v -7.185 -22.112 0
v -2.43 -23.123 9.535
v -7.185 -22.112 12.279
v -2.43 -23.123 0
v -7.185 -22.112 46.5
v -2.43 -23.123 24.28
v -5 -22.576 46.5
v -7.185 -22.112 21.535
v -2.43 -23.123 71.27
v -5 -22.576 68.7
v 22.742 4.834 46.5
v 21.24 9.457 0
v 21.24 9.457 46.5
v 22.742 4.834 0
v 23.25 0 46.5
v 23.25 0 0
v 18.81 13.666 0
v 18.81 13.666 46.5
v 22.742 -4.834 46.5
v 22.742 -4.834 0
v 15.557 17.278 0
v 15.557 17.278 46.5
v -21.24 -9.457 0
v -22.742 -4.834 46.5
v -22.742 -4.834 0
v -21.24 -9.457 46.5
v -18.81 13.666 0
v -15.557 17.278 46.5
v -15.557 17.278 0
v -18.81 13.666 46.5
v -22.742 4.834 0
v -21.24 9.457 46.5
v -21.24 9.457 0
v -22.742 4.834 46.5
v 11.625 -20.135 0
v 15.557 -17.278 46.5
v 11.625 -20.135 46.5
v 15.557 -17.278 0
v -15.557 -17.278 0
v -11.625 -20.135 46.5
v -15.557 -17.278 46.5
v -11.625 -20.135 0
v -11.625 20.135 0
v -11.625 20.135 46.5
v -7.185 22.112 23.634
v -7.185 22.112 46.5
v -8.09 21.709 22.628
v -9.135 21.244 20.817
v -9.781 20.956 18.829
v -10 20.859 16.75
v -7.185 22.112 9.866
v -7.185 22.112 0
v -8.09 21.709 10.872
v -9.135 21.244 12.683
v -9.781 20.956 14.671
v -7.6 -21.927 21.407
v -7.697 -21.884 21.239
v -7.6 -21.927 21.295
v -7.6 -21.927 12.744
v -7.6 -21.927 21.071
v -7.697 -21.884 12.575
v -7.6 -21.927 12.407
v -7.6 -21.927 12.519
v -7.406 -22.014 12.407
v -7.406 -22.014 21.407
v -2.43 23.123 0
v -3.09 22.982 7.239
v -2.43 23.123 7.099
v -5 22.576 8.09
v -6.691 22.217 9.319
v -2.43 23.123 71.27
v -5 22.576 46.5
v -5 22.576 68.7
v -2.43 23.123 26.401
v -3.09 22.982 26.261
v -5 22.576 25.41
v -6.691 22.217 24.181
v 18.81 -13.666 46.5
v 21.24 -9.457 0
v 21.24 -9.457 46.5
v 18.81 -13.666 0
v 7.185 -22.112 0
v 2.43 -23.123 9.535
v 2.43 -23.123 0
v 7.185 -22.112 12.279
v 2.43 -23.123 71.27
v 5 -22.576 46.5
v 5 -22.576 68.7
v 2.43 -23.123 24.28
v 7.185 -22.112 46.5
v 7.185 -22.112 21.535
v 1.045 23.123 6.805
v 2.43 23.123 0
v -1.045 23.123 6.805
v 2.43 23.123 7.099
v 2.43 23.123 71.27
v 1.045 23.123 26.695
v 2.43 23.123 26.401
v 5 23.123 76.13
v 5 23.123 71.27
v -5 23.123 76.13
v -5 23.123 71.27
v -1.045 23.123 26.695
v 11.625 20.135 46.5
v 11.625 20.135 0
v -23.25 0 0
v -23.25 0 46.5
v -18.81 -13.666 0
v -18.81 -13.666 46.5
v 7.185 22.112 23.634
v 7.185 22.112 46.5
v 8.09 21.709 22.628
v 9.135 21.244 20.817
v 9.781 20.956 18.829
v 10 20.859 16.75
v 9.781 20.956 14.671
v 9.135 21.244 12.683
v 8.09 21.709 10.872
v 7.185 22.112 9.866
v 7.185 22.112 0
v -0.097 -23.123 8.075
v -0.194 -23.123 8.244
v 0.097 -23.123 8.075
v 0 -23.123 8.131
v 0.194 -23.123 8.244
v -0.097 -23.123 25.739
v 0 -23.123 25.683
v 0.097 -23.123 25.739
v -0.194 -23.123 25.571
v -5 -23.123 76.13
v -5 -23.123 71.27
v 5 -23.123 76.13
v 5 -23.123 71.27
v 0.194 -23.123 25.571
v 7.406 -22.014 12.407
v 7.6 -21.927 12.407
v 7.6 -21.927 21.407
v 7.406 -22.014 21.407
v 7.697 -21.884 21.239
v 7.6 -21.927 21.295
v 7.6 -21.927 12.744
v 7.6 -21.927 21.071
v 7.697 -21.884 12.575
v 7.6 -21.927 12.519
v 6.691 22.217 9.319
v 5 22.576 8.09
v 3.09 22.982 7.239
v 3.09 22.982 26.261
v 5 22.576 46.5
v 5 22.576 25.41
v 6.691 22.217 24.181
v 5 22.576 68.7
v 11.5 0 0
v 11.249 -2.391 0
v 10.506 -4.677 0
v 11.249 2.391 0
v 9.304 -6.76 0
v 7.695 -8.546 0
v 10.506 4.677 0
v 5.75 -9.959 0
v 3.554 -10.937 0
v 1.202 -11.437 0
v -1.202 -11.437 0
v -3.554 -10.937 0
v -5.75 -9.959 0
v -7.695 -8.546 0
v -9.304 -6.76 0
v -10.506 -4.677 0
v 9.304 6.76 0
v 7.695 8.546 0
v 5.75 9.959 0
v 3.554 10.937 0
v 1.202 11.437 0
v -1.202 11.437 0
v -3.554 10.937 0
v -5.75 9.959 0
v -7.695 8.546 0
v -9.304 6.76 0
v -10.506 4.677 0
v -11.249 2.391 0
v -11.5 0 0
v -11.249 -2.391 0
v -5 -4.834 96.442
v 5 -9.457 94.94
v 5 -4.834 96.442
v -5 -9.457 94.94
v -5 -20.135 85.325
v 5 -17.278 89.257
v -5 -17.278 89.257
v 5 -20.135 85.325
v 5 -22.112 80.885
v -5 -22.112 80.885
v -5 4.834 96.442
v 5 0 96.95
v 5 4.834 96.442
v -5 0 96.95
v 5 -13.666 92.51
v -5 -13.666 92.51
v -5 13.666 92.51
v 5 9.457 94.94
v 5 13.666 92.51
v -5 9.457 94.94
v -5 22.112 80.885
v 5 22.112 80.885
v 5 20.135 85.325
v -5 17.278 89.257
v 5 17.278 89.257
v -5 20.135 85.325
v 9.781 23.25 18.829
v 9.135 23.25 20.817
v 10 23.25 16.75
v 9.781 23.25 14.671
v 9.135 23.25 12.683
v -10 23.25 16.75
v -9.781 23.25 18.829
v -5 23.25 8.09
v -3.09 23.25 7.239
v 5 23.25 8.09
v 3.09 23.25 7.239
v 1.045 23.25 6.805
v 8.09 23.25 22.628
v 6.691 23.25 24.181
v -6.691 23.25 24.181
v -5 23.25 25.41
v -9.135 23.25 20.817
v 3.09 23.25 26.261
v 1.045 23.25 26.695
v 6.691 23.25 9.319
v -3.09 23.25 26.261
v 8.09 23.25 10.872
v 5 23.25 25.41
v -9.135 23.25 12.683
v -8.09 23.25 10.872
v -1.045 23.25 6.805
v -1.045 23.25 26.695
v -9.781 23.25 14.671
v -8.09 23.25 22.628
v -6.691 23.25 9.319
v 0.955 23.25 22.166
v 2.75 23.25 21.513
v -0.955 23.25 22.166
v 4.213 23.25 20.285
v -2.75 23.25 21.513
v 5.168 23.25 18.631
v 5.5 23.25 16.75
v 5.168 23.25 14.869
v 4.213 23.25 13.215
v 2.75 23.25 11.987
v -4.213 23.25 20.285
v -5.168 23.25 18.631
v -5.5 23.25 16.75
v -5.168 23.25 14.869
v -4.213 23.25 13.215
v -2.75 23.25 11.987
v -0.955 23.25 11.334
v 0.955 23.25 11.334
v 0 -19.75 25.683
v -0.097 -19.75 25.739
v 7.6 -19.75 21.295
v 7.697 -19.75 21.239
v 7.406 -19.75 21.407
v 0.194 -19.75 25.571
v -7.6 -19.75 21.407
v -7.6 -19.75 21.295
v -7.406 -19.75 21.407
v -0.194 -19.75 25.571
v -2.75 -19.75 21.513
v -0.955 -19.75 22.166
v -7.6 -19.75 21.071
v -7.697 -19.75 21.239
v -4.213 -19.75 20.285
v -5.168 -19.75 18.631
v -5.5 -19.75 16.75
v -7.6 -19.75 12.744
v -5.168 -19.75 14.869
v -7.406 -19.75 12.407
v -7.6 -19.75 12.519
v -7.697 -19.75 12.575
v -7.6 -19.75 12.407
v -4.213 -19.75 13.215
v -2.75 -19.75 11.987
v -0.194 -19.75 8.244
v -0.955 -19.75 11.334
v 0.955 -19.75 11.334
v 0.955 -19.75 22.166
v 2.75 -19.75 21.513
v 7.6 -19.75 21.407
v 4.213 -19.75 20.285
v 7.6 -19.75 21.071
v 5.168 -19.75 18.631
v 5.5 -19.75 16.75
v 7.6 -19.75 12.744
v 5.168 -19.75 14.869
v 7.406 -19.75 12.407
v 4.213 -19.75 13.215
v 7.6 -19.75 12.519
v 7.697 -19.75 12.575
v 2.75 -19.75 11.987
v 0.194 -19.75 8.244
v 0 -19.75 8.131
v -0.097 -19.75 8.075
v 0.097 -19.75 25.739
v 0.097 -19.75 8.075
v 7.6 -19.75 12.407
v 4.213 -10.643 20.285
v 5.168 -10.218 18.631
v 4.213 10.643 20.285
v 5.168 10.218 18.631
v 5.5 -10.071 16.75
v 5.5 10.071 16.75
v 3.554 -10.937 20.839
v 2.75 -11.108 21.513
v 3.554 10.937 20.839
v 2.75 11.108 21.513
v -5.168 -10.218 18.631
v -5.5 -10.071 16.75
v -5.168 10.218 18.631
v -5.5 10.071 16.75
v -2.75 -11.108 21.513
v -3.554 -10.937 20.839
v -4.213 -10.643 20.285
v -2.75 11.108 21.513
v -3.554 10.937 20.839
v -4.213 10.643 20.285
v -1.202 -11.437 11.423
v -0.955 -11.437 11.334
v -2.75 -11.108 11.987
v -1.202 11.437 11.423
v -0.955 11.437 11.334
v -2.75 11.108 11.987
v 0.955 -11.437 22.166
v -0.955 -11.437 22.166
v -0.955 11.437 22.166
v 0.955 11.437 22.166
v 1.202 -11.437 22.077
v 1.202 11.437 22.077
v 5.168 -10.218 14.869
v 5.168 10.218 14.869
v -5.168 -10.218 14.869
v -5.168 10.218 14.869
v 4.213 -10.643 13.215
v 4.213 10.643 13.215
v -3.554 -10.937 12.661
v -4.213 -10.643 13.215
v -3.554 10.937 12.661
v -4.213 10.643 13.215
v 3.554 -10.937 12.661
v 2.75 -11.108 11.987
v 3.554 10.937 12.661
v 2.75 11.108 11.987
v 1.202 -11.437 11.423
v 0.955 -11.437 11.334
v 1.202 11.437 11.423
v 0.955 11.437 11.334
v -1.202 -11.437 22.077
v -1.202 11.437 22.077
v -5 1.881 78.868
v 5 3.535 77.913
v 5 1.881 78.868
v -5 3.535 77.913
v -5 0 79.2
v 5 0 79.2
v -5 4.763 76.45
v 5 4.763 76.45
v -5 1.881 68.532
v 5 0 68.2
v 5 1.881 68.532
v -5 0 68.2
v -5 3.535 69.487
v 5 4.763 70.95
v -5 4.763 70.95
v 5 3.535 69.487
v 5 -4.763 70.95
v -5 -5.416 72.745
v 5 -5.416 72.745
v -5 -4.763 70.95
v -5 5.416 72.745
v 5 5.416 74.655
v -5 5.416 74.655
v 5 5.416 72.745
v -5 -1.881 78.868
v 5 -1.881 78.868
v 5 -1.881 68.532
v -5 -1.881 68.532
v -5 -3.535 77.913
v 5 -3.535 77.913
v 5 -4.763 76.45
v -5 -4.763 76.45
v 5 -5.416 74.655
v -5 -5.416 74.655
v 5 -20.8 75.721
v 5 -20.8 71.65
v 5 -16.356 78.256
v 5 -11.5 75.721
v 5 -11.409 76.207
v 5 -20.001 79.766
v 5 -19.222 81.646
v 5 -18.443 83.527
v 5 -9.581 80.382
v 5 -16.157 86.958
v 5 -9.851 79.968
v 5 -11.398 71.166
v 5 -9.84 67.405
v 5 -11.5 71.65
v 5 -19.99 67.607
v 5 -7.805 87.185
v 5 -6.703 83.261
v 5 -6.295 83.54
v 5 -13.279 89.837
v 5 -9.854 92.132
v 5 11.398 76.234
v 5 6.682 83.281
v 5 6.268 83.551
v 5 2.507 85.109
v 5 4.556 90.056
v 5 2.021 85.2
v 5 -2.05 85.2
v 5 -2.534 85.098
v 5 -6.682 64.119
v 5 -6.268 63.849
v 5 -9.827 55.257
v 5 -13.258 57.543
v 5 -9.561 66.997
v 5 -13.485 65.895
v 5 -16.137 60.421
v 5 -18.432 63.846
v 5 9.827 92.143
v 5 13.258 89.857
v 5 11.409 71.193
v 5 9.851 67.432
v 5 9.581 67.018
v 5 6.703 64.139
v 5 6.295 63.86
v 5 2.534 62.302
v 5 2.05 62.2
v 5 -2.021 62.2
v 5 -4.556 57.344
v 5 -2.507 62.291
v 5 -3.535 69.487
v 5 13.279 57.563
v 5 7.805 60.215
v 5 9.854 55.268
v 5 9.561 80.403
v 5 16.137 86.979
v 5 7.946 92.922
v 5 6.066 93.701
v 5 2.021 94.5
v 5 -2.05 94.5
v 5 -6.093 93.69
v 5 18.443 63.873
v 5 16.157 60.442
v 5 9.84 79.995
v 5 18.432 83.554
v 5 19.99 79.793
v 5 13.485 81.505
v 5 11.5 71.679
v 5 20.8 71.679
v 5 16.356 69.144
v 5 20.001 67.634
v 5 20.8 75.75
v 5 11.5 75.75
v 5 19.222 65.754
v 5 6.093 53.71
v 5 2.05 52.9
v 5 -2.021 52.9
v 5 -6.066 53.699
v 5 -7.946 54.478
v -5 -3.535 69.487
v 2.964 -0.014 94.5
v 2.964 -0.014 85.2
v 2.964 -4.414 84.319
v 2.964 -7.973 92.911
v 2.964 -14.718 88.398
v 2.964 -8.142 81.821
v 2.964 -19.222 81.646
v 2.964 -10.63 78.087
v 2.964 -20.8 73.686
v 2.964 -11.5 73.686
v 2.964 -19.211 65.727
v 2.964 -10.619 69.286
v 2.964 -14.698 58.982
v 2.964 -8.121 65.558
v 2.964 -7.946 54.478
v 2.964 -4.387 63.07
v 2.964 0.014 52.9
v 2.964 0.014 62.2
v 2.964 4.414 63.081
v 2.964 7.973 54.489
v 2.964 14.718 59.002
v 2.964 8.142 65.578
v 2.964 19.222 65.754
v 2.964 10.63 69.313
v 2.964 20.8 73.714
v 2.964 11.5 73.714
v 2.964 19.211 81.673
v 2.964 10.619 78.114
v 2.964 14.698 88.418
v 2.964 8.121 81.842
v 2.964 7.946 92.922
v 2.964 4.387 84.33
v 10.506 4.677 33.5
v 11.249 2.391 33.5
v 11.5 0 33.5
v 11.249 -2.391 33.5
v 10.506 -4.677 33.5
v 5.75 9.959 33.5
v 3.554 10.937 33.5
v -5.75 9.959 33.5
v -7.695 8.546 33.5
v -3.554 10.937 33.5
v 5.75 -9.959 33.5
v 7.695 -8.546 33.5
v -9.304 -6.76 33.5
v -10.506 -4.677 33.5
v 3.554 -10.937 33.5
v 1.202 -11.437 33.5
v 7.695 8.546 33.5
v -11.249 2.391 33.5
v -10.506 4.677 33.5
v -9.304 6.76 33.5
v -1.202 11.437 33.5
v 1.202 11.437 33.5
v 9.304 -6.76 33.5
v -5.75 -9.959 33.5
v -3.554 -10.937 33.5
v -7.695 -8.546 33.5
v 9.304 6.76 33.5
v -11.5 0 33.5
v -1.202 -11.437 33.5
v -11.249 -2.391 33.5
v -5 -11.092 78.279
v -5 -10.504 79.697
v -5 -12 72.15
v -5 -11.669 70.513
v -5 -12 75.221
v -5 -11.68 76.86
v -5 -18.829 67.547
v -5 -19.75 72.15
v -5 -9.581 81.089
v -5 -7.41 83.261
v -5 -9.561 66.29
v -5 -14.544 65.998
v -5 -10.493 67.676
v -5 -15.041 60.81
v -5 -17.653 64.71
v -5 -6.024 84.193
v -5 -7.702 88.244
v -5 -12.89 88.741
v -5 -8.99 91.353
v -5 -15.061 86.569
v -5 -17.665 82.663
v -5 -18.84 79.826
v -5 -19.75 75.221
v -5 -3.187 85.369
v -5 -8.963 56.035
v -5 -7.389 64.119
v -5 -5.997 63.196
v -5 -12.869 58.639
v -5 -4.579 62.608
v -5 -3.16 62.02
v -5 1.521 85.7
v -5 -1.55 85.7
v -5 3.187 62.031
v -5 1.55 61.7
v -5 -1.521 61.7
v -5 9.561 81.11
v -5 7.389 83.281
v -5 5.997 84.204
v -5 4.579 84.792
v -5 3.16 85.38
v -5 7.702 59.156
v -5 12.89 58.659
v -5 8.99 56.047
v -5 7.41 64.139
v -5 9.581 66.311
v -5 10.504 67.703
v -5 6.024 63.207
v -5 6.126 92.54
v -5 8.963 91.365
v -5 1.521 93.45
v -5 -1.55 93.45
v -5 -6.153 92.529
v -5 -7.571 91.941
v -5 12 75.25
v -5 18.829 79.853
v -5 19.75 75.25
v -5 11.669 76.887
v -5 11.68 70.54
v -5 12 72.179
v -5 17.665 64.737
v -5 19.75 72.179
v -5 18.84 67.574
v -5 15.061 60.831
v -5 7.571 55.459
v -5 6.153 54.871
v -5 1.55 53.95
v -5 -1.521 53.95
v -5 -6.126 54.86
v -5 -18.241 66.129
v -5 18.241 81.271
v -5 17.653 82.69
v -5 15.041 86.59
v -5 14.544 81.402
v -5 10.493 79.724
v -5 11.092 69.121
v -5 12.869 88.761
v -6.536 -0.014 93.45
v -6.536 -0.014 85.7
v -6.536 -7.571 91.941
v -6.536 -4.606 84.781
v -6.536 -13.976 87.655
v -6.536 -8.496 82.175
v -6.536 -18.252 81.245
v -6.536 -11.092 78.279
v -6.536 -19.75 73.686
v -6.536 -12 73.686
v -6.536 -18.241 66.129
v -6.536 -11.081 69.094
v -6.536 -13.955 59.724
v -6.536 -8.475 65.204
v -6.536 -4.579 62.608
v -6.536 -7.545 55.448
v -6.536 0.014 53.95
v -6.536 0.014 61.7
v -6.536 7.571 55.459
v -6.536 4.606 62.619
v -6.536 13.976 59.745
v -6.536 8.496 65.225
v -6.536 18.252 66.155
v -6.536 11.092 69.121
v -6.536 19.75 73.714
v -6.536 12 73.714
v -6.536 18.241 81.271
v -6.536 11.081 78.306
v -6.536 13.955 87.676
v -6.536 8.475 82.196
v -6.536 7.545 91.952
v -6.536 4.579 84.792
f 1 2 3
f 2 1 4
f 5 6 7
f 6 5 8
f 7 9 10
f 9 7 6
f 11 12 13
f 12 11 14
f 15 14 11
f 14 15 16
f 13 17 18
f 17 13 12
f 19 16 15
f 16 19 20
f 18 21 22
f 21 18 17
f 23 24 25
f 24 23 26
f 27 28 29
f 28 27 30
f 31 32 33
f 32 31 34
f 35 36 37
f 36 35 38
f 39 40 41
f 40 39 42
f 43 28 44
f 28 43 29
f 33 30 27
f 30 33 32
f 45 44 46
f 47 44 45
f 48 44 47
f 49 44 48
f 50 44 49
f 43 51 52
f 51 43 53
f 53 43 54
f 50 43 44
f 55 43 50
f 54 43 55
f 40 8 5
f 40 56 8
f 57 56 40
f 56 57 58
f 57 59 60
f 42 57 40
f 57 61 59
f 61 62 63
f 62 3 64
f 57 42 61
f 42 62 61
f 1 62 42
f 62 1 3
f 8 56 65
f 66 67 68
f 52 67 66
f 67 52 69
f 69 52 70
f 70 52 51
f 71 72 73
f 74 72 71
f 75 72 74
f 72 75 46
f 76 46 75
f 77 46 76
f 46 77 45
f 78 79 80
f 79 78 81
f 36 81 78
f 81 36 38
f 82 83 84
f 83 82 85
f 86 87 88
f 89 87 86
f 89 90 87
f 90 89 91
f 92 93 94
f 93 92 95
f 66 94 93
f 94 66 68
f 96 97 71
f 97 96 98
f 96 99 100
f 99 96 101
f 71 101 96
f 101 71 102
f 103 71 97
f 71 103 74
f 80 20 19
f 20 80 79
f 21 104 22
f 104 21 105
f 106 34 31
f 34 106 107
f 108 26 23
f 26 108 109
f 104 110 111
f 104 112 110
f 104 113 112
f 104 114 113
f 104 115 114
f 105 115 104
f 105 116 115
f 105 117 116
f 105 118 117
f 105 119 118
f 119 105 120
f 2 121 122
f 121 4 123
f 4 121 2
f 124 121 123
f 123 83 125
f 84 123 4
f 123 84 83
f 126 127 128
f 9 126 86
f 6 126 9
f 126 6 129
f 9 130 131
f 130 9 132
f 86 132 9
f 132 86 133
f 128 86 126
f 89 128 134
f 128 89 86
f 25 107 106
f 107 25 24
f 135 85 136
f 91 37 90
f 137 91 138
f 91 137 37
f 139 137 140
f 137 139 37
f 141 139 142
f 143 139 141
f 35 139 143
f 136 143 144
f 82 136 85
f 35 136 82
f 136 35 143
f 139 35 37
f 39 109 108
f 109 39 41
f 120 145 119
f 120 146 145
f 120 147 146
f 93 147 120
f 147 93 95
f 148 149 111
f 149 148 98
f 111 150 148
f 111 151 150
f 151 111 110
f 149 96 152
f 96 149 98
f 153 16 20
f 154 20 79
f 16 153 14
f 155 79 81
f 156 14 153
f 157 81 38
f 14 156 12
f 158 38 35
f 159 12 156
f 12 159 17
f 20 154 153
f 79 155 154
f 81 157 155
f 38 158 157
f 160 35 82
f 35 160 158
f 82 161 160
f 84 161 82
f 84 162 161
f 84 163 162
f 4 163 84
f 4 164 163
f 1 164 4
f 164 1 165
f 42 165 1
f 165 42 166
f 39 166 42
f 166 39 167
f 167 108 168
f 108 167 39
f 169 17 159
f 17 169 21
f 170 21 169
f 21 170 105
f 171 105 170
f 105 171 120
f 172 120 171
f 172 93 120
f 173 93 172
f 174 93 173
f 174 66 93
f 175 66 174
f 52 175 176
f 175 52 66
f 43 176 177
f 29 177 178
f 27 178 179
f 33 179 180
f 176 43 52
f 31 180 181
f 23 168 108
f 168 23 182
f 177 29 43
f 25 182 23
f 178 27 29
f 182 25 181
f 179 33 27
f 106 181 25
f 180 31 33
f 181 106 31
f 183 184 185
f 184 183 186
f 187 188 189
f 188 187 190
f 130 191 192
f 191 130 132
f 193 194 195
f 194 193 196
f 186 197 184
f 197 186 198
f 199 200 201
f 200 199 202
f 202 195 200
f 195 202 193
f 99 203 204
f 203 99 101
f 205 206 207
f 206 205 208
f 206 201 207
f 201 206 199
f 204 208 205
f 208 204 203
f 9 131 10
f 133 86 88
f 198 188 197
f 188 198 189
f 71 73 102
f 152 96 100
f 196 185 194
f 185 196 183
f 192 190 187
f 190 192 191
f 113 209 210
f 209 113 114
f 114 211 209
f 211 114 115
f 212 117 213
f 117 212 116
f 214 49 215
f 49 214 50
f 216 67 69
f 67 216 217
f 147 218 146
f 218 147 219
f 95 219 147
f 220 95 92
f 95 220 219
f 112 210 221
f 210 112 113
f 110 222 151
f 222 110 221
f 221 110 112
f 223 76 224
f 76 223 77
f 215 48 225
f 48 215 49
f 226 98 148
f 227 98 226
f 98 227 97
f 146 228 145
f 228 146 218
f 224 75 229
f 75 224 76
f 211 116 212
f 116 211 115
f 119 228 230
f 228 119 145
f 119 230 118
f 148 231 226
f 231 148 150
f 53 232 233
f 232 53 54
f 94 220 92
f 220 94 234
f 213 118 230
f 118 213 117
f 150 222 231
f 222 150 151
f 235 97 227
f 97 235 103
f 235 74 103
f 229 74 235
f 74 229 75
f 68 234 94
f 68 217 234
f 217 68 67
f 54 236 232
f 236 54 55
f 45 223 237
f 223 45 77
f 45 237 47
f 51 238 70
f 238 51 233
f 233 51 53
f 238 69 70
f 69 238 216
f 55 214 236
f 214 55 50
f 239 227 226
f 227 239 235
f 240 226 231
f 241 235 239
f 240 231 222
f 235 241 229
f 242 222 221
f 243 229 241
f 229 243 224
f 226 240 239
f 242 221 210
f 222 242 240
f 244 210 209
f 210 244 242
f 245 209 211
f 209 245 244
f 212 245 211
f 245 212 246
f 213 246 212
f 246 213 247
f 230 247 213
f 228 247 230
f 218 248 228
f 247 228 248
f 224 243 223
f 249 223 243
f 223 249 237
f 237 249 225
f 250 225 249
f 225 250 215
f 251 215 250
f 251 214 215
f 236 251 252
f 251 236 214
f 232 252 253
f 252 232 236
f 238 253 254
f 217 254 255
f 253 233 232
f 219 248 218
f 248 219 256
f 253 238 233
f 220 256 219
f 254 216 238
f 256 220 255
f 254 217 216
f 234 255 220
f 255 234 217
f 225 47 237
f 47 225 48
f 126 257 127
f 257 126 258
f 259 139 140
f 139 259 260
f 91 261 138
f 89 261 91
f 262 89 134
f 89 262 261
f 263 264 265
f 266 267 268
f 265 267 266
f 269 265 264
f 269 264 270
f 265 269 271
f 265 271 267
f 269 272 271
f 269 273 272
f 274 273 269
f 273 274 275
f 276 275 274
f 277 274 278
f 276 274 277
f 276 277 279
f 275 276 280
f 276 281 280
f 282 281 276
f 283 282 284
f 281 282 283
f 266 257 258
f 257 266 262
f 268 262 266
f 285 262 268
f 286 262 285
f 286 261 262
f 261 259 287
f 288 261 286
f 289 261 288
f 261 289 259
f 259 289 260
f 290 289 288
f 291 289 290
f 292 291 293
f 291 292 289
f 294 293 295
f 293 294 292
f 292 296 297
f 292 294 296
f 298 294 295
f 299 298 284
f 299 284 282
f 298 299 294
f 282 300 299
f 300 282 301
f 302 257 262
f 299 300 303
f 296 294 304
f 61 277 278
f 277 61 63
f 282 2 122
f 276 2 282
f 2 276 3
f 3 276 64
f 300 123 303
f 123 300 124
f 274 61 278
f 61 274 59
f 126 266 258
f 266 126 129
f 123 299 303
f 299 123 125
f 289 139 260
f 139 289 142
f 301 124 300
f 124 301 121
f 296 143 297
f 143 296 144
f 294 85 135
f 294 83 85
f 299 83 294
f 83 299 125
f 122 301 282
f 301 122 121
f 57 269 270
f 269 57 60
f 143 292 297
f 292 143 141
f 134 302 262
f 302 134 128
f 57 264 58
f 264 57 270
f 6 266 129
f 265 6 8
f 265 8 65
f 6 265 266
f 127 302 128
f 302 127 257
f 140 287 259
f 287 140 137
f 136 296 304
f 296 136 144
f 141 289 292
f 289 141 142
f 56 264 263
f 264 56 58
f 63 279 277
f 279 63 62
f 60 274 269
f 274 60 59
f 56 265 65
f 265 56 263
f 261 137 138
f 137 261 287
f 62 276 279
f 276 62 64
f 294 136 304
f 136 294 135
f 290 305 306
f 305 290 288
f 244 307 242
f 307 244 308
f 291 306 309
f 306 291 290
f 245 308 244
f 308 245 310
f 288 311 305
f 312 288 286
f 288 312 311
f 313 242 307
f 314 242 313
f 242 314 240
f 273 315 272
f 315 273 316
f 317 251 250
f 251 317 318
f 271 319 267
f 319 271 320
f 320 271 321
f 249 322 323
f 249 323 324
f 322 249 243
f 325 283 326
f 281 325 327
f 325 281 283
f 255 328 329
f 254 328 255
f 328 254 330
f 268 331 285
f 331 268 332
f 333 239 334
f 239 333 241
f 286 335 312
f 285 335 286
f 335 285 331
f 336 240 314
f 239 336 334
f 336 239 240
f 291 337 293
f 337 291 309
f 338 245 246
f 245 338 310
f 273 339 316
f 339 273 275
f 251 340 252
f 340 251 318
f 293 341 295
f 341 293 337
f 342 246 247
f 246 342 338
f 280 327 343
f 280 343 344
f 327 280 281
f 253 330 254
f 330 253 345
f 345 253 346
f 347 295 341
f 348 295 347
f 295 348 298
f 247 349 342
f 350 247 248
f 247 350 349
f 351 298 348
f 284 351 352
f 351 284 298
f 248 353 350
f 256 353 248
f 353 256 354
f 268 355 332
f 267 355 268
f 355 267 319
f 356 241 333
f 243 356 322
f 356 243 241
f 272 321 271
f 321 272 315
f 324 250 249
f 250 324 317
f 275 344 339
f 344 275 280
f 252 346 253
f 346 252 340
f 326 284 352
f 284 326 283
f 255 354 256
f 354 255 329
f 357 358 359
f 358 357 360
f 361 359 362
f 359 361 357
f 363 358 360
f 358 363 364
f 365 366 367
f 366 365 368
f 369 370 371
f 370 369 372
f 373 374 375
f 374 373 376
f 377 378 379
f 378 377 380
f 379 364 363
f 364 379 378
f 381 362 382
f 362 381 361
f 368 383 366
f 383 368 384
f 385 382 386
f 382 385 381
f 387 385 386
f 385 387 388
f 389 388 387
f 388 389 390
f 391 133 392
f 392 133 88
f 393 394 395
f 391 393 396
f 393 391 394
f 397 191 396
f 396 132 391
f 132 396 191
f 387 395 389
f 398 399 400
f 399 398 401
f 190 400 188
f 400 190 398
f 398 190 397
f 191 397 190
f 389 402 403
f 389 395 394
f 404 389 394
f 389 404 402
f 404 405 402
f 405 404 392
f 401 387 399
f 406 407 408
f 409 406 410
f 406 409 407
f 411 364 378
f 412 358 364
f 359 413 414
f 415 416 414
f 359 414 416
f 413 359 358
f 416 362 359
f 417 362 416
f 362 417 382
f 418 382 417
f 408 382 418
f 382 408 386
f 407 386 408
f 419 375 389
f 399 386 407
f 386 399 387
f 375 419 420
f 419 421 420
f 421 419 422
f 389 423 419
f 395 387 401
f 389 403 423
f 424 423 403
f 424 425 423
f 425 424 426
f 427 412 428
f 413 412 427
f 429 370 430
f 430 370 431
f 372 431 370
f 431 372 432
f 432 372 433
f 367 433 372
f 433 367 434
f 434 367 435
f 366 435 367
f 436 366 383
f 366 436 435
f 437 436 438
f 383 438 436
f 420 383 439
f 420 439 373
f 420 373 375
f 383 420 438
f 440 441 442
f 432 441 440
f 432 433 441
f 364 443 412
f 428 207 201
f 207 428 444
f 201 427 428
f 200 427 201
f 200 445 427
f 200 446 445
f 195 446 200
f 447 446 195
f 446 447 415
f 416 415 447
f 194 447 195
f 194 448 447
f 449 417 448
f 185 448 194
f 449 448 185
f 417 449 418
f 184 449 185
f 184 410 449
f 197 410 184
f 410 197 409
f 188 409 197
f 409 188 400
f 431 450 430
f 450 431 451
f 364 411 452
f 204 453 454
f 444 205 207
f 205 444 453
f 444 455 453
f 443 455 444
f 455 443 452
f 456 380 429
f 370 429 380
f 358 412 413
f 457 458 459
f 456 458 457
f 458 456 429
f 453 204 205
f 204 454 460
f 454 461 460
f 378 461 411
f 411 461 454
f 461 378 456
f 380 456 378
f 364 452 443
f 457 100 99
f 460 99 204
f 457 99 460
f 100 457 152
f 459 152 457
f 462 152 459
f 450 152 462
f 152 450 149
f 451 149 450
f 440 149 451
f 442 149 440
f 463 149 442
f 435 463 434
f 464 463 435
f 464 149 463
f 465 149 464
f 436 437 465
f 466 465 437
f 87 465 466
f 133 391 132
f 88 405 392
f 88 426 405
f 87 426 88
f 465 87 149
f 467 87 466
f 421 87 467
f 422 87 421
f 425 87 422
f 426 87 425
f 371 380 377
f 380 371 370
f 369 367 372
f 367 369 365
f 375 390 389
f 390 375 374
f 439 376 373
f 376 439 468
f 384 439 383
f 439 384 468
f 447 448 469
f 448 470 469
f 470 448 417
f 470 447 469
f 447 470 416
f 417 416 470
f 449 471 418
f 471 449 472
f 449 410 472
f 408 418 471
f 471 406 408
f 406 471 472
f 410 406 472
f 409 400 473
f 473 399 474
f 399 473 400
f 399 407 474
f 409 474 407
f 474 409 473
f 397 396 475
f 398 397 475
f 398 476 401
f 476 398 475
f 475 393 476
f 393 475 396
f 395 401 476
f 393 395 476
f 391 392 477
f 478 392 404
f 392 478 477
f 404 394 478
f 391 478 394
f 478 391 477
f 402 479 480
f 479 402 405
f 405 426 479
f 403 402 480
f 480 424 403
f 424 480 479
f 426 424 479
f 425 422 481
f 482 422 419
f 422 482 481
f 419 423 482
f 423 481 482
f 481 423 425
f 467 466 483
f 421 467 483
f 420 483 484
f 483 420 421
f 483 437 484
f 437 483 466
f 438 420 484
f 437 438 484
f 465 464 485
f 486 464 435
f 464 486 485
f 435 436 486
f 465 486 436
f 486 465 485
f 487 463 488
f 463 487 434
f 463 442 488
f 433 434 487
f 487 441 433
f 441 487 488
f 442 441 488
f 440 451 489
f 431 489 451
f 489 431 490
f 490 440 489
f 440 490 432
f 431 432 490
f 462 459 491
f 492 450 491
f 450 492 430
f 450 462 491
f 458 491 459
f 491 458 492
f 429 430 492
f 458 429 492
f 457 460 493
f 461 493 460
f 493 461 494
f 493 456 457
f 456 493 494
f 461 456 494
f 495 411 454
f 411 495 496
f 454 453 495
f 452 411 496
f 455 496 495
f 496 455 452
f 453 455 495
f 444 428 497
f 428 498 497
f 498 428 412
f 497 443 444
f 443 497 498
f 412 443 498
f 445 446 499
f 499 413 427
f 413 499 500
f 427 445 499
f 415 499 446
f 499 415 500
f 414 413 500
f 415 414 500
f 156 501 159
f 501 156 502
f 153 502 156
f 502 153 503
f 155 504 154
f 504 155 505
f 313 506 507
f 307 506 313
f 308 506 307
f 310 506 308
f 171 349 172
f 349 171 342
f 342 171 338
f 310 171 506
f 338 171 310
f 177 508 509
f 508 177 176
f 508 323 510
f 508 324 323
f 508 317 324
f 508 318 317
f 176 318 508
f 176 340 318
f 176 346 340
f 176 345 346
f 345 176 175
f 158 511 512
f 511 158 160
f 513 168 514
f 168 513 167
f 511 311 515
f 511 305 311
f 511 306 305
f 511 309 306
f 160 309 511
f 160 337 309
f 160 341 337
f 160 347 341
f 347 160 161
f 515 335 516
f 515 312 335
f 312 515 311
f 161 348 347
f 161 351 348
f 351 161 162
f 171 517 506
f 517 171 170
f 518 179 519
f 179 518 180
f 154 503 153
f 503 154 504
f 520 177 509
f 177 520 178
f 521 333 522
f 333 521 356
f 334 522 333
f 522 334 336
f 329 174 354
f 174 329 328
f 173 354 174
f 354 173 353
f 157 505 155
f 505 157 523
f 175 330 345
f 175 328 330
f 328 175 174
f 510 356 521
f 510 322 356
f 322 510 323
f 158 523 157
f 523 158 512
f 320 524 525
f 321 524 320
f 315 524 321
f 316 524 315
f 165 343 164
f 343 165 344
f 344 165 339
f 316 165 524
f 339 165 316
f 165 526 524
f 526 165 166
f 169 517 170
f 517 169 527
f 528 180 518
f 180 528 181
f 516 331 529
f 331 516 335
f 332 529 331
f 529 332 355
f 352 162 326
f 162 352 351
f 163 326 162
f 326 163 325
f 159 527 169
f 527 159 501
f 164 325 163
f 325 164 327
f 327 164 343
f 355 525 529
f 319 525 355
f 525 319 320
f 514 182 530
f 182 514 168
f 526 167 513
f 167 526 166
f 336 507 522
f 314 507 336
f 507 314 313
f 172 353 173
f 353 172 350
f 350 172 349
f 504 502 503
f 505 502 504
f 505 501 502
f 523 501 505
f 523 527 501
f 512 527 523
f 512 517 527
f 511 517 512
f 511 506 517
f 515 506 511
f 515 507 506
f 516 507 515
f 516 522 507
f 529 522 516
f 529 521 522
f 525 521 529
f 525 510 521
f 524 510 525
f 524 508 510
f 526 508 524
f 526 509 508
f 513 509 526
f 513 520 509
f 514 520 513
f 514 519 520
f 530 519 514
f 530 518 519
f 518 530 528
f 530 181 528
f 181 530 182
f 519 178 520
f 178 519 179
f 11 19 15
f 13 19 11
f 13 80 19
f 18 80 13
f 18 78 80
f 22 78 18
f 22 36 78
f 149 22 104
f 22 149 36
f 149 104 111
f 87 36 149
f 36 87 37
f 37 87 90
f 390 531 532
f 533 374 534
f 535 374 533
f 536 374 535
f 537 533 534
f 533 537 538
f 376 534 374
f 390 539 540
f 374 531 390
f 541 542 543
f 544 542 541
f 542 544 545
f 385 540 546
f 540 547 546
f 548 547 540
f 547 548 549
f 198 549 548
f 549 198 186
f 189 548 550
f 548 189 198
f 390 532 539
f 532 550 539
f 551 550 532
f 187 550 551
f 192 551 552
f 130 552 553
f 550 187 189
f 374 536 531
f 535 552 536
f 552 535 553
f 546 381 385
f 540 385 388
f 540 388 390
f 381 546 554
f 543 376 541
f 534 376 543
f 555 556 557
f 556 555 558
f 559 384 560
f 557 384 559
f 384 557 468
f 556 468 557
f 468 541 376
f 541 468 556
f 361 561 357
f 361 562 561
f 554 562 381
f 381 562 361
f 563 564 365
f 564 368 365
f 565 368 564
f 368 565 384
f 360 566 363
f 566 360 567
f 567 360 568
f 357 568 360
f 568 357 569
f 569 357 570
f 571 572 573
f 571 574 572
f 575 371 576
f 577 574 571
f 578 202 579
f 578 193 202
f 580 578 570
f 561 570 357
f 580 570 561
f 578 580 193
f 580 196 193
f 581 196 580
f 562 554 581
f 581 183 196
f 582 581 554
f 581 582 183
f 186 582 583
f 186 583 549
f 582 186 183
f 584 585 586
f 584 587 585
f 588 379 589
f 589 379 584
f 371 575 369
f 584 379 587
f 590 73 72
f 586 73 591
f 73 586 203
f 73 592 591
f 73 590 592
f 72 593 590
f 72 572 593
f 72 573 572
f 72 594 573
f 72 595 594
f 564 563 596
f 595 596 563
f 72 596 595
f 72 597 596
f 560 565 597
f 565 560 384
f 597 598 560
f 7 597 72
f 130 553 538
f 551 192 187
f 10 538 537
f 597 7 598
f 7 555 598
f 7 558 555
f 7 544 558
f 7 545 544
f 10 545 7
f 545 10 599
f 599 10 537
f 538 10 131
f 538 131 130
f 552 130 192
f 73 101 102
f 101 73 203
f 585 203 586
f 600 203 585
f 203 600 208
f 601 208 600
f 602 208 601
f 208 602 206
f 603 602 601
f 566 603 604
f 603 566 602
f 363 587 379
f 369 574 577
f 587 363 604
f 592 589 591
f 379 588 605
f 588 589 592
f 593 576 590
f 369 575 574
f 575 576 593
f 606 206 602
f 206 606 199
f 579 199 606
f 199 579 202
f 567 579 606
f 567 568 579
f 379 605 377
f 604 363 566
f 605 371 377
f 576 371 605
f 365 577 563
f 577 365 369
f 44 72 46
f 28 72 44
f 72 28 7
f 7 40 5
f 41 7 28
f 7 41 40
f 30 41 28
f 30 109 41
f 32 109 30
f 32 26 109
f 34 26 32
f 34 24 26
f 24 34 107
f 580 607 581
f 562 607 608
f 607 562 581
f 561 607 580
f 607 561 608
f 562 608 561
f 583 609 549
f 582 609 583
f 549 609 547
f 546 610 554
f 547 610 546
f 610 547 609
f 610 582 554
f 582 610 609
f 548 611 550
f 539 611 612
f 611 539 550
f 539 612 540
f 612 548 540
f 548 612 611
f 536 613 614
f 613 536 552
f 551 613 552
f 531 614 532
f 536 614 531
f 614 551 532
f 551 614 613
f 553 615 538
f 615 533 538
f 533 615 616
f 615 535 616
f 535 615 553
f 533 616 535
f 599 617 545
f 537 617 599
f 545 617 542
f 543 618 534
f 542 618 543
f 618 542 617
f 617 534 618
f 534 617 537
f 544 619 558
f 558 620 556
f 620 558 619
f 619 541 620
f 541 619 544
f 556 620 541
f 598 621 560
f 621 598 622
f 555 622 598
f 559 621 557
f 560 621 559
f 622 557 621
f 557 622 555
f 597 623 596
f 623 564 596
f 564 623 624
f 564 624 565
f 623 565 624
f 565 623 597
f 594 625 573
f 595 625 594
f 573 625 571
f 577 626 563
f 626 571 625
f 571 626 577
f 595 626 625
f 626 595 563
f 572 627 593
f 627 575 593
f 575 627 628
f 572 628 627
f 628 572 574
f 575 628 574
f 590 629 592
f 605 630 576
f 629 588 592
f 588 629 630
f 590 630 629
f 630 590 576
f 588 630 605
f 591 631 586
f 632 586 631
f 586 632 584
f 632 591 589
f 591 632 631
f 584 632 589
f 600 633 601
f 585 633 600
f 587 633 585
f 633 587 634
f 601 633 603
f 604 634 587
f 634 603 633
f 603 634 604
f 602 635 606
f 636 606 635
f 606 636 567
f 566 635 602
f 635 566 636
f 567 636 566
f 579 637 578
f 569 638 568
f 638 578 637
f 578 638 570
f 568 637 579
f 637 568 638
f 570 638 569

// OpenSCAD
/*

    WIP Joint for connecting two lenths of PVC pipe at adjustable angles.
    
    Print with pipe opening down for best bed adhesion, lowest pipe opening
    distortion and strongest teeth.  
    
    Lots of testing remains to get fitings and clearances correct, and also
    needs work on being properly parametric as well as field testing for 
    strength, durability, etc. (details in TODO's below).
    
    We've had good results printing this on its side (with the flat-end of the
    joint on the bed) at 30% infill.

*/

// TODO: Increase negative tooth depth, consider increasing tooth size, reducing tooth count
// TODO: Fix parametrics (maybe just don't resize anything but the pipe openings for now?)
// TODO: Extract rotate_about into a separate utility module file
// TOOD: Extract the bolt into a separate reusable module file
// TODO: Make bolt size more parametric

// TODO: Remove unused bolt code (no countersinks, etc.)


// Globals
TOLERANCE = 1;

// Rotates object around specified point
module rotate_about_pt(z, y, pt) {
    translate(pt)
        rotate([0, y, z])
            translate(-pt)
                children();   
}

// 3/8" bolt 
// l pareamter determines the overall length of the bolt
// t parameter increases dimensions to compensate for printer tolerance
module bolt(l, t){
    
    BOLT_LENGTH = l;
    HEAD_LENGTH = 14.2 + t;
    HEAD_WIDTH = 8 + t;
    HEAD_HEIGHT = 6 + t;
    SHAFT_DIAMETER = 10 + t;
    
    cylinder(r=SHAFT_DIAMETER/2,h=BOLT_LENGTH);
    translate([-HEAD_LENGTH/2,-HEAD_LENGTH/3.5,BOLT_LENGTH-HEAD_HEIGHT]){        
        cube([HEAD_LENGTH, HEAD_WIDTH, HEAD_HEIGHT]);
        rotate_about_pt(60,0,[HEAD_LENGTH/2,HEAD_WIDTH/2,0]){
            cube([HEAD_LENGTH, HEAD_WIDTH, HEAD_HEIGHT]);
            rotate_about_pt(60,0,[HEAD_LENGTH/2,HEAD_WIDTH/2,0]){
                cube([HEAD_LENGTH, HEAD_WIDTH, HEAD_HEIGHT]);
            }
        }
    }
}

// Adjustable joint for 1" PVC
// teeth parameter determines if this is the end with teeth
// count parameter determines the number of teeth
module pvc_joint_spur(count) {

    PIPE_OD = 33.5; //34; //25.5;
    WALL_THICKNESS = 13;
    OUTER_SHELL_OD = PIPE_OD+WALL_THICKNESS;
    JOINT_BOLT_LENGTH = 50; // ~2" ???
    PIPE_BOLT_LENGTH = 57;  // ~2.25" ???
    SOCKET_OD = 24;         // Diameter of socket used to tighten joint

    difference(){
        union(){
            
            // Main outer shell
            cylinder(r=OUTER_SHELL_OD/2, h=OUTER_SHELL_OD*1.6);
            
            // Joint
             translate([-OUTER_SHELL_OD/2,0,PIPE_OD*2.2]){
                rotate([0,90,0]){
                    cylinder(r=OUTER_SHELL_OD/2,h=OUTER_SHELL_OD);
                }
            }
            
            // Cylinder for the pipe bolt nut to tighten against
            translate([0,OUTER_SHELL_OD/2,PIPE_OD/2]){
                    rotate([90,0,0]){
                        cylinder(r=10,h=PIPE_OD);
                }
            }
        }        
        
        // Pipe opening
        //cylinder(r=(PIPE_OD+TOLERANCE)/2, h=PIPE_OD);
        // NOTE: Use 1/2" pipe for this part
        cylinder(r=(22+TOLERANCE)/2, h=PIPE_OD);
        
        // Pipe bolt hole
        // NOTE: "10" is kind of a magic number here, it will vary
        // depending on the size of the bolt head, which is fixed
        // for now but once this is fully parametric will need to change
        translate([0,PIPE_BOLT_LENGTH-(PIPE_OD/2)-10,PIPE_OD/2]){
                rotate([90,0,0]){             
                bolt(PIPE_BOLT_LENGTH, TOLERANCE);
            }
        }
        
        // Cut-aways
        translate([5,-OUTER_SHELL_OD/2,OUTER_SHELL_OD]){
            cube([PIPE_OD,OUTER_SHELL_OD,PIPE_OD*2]);
        }
        translate([-PIPE_OD-5,-OUTER_SHELL_OD/2,OUTER_SHELL_OD]){
            cube([PIPE_OD,OUTER_SHELL_OD,PIPE_OD*2]);
        }        
                
        // If this end has teeth, cut the bolt hole
        // and countersink the head
        /*
        if (teeth){
            
            // Joint bolt hole
            translate([26,0,PIPE_OD*2.2]){
                rotate([0,-90,0]){
                    bolt(JOINT_BOLT_LENGTH, TOLERANCE);
                }
            }
            
        } else {
        */
            // If this is the end without teeth, cut a 
            // hole for the bolt, a hole to countersink
            // the washer & nut and then grooves for the teeth
            
            // Joint bolt hole
            translate([5,0,PIPE_OD*2.2]){
                rotate([0,-90,0]){
                    bolt(JOINT_BOLT_LENGTH, TOLERANCE);
                }
            }
            /*
            // Joint nut & washer countersink
            // SOCKET_OD should accomodate putting a socket
            // on the nut to tighten the joint
            translate([-OUTER_SHELL_OD/3,0,PIPE_OD*2.2]){
                rotate([0,-90,0]){
                    cylinder(r=(SOCKET_OD+TOLERANCE)/2,h=PIPE_OD/2);
                }
            }            
            */
            // Grooves for the teeth
            translate([6.5,0,PIPE_OD*2.2]){                
                for(i=[0:count]){
                    rotate([i*(360/count),0,0]){
                        translate([0,-3.55,11.5]){
                            rotate([0,0,45]){
                                cube([5,5,OUTER_SHELL_OD/5]);
                            }
                        }
                    }
                }
            }  
        /*
        }
        */
    }

    // Teeth
    //if (teeth){
        translate([-3,0,PIPE_OD*2.2]){
            for(i=[0:count]){
                rotate([i*(360/count),0,0]){
                    translate([0,-3.55,12]){
                        rotate([0,0,45]){
                            cube([5,5,OUTER_SHELL_OD/6]);
                        }
                    }
                }
            }
        }
    //}
}

// Sample layout
pvc_joint_spur(count=16);

/*
// Two-way joint
color("blue"){
    translate([10,0,149.5]){
        rotate([180,0,0]){
            rotate([0,0,180]){
                pvc_joint(teeth=true, count=20);
            }
        }
    }
}
*/

/*
// Ruler
translate([25,0,0]){
    cube([10,10,127.5]);
}
*/
